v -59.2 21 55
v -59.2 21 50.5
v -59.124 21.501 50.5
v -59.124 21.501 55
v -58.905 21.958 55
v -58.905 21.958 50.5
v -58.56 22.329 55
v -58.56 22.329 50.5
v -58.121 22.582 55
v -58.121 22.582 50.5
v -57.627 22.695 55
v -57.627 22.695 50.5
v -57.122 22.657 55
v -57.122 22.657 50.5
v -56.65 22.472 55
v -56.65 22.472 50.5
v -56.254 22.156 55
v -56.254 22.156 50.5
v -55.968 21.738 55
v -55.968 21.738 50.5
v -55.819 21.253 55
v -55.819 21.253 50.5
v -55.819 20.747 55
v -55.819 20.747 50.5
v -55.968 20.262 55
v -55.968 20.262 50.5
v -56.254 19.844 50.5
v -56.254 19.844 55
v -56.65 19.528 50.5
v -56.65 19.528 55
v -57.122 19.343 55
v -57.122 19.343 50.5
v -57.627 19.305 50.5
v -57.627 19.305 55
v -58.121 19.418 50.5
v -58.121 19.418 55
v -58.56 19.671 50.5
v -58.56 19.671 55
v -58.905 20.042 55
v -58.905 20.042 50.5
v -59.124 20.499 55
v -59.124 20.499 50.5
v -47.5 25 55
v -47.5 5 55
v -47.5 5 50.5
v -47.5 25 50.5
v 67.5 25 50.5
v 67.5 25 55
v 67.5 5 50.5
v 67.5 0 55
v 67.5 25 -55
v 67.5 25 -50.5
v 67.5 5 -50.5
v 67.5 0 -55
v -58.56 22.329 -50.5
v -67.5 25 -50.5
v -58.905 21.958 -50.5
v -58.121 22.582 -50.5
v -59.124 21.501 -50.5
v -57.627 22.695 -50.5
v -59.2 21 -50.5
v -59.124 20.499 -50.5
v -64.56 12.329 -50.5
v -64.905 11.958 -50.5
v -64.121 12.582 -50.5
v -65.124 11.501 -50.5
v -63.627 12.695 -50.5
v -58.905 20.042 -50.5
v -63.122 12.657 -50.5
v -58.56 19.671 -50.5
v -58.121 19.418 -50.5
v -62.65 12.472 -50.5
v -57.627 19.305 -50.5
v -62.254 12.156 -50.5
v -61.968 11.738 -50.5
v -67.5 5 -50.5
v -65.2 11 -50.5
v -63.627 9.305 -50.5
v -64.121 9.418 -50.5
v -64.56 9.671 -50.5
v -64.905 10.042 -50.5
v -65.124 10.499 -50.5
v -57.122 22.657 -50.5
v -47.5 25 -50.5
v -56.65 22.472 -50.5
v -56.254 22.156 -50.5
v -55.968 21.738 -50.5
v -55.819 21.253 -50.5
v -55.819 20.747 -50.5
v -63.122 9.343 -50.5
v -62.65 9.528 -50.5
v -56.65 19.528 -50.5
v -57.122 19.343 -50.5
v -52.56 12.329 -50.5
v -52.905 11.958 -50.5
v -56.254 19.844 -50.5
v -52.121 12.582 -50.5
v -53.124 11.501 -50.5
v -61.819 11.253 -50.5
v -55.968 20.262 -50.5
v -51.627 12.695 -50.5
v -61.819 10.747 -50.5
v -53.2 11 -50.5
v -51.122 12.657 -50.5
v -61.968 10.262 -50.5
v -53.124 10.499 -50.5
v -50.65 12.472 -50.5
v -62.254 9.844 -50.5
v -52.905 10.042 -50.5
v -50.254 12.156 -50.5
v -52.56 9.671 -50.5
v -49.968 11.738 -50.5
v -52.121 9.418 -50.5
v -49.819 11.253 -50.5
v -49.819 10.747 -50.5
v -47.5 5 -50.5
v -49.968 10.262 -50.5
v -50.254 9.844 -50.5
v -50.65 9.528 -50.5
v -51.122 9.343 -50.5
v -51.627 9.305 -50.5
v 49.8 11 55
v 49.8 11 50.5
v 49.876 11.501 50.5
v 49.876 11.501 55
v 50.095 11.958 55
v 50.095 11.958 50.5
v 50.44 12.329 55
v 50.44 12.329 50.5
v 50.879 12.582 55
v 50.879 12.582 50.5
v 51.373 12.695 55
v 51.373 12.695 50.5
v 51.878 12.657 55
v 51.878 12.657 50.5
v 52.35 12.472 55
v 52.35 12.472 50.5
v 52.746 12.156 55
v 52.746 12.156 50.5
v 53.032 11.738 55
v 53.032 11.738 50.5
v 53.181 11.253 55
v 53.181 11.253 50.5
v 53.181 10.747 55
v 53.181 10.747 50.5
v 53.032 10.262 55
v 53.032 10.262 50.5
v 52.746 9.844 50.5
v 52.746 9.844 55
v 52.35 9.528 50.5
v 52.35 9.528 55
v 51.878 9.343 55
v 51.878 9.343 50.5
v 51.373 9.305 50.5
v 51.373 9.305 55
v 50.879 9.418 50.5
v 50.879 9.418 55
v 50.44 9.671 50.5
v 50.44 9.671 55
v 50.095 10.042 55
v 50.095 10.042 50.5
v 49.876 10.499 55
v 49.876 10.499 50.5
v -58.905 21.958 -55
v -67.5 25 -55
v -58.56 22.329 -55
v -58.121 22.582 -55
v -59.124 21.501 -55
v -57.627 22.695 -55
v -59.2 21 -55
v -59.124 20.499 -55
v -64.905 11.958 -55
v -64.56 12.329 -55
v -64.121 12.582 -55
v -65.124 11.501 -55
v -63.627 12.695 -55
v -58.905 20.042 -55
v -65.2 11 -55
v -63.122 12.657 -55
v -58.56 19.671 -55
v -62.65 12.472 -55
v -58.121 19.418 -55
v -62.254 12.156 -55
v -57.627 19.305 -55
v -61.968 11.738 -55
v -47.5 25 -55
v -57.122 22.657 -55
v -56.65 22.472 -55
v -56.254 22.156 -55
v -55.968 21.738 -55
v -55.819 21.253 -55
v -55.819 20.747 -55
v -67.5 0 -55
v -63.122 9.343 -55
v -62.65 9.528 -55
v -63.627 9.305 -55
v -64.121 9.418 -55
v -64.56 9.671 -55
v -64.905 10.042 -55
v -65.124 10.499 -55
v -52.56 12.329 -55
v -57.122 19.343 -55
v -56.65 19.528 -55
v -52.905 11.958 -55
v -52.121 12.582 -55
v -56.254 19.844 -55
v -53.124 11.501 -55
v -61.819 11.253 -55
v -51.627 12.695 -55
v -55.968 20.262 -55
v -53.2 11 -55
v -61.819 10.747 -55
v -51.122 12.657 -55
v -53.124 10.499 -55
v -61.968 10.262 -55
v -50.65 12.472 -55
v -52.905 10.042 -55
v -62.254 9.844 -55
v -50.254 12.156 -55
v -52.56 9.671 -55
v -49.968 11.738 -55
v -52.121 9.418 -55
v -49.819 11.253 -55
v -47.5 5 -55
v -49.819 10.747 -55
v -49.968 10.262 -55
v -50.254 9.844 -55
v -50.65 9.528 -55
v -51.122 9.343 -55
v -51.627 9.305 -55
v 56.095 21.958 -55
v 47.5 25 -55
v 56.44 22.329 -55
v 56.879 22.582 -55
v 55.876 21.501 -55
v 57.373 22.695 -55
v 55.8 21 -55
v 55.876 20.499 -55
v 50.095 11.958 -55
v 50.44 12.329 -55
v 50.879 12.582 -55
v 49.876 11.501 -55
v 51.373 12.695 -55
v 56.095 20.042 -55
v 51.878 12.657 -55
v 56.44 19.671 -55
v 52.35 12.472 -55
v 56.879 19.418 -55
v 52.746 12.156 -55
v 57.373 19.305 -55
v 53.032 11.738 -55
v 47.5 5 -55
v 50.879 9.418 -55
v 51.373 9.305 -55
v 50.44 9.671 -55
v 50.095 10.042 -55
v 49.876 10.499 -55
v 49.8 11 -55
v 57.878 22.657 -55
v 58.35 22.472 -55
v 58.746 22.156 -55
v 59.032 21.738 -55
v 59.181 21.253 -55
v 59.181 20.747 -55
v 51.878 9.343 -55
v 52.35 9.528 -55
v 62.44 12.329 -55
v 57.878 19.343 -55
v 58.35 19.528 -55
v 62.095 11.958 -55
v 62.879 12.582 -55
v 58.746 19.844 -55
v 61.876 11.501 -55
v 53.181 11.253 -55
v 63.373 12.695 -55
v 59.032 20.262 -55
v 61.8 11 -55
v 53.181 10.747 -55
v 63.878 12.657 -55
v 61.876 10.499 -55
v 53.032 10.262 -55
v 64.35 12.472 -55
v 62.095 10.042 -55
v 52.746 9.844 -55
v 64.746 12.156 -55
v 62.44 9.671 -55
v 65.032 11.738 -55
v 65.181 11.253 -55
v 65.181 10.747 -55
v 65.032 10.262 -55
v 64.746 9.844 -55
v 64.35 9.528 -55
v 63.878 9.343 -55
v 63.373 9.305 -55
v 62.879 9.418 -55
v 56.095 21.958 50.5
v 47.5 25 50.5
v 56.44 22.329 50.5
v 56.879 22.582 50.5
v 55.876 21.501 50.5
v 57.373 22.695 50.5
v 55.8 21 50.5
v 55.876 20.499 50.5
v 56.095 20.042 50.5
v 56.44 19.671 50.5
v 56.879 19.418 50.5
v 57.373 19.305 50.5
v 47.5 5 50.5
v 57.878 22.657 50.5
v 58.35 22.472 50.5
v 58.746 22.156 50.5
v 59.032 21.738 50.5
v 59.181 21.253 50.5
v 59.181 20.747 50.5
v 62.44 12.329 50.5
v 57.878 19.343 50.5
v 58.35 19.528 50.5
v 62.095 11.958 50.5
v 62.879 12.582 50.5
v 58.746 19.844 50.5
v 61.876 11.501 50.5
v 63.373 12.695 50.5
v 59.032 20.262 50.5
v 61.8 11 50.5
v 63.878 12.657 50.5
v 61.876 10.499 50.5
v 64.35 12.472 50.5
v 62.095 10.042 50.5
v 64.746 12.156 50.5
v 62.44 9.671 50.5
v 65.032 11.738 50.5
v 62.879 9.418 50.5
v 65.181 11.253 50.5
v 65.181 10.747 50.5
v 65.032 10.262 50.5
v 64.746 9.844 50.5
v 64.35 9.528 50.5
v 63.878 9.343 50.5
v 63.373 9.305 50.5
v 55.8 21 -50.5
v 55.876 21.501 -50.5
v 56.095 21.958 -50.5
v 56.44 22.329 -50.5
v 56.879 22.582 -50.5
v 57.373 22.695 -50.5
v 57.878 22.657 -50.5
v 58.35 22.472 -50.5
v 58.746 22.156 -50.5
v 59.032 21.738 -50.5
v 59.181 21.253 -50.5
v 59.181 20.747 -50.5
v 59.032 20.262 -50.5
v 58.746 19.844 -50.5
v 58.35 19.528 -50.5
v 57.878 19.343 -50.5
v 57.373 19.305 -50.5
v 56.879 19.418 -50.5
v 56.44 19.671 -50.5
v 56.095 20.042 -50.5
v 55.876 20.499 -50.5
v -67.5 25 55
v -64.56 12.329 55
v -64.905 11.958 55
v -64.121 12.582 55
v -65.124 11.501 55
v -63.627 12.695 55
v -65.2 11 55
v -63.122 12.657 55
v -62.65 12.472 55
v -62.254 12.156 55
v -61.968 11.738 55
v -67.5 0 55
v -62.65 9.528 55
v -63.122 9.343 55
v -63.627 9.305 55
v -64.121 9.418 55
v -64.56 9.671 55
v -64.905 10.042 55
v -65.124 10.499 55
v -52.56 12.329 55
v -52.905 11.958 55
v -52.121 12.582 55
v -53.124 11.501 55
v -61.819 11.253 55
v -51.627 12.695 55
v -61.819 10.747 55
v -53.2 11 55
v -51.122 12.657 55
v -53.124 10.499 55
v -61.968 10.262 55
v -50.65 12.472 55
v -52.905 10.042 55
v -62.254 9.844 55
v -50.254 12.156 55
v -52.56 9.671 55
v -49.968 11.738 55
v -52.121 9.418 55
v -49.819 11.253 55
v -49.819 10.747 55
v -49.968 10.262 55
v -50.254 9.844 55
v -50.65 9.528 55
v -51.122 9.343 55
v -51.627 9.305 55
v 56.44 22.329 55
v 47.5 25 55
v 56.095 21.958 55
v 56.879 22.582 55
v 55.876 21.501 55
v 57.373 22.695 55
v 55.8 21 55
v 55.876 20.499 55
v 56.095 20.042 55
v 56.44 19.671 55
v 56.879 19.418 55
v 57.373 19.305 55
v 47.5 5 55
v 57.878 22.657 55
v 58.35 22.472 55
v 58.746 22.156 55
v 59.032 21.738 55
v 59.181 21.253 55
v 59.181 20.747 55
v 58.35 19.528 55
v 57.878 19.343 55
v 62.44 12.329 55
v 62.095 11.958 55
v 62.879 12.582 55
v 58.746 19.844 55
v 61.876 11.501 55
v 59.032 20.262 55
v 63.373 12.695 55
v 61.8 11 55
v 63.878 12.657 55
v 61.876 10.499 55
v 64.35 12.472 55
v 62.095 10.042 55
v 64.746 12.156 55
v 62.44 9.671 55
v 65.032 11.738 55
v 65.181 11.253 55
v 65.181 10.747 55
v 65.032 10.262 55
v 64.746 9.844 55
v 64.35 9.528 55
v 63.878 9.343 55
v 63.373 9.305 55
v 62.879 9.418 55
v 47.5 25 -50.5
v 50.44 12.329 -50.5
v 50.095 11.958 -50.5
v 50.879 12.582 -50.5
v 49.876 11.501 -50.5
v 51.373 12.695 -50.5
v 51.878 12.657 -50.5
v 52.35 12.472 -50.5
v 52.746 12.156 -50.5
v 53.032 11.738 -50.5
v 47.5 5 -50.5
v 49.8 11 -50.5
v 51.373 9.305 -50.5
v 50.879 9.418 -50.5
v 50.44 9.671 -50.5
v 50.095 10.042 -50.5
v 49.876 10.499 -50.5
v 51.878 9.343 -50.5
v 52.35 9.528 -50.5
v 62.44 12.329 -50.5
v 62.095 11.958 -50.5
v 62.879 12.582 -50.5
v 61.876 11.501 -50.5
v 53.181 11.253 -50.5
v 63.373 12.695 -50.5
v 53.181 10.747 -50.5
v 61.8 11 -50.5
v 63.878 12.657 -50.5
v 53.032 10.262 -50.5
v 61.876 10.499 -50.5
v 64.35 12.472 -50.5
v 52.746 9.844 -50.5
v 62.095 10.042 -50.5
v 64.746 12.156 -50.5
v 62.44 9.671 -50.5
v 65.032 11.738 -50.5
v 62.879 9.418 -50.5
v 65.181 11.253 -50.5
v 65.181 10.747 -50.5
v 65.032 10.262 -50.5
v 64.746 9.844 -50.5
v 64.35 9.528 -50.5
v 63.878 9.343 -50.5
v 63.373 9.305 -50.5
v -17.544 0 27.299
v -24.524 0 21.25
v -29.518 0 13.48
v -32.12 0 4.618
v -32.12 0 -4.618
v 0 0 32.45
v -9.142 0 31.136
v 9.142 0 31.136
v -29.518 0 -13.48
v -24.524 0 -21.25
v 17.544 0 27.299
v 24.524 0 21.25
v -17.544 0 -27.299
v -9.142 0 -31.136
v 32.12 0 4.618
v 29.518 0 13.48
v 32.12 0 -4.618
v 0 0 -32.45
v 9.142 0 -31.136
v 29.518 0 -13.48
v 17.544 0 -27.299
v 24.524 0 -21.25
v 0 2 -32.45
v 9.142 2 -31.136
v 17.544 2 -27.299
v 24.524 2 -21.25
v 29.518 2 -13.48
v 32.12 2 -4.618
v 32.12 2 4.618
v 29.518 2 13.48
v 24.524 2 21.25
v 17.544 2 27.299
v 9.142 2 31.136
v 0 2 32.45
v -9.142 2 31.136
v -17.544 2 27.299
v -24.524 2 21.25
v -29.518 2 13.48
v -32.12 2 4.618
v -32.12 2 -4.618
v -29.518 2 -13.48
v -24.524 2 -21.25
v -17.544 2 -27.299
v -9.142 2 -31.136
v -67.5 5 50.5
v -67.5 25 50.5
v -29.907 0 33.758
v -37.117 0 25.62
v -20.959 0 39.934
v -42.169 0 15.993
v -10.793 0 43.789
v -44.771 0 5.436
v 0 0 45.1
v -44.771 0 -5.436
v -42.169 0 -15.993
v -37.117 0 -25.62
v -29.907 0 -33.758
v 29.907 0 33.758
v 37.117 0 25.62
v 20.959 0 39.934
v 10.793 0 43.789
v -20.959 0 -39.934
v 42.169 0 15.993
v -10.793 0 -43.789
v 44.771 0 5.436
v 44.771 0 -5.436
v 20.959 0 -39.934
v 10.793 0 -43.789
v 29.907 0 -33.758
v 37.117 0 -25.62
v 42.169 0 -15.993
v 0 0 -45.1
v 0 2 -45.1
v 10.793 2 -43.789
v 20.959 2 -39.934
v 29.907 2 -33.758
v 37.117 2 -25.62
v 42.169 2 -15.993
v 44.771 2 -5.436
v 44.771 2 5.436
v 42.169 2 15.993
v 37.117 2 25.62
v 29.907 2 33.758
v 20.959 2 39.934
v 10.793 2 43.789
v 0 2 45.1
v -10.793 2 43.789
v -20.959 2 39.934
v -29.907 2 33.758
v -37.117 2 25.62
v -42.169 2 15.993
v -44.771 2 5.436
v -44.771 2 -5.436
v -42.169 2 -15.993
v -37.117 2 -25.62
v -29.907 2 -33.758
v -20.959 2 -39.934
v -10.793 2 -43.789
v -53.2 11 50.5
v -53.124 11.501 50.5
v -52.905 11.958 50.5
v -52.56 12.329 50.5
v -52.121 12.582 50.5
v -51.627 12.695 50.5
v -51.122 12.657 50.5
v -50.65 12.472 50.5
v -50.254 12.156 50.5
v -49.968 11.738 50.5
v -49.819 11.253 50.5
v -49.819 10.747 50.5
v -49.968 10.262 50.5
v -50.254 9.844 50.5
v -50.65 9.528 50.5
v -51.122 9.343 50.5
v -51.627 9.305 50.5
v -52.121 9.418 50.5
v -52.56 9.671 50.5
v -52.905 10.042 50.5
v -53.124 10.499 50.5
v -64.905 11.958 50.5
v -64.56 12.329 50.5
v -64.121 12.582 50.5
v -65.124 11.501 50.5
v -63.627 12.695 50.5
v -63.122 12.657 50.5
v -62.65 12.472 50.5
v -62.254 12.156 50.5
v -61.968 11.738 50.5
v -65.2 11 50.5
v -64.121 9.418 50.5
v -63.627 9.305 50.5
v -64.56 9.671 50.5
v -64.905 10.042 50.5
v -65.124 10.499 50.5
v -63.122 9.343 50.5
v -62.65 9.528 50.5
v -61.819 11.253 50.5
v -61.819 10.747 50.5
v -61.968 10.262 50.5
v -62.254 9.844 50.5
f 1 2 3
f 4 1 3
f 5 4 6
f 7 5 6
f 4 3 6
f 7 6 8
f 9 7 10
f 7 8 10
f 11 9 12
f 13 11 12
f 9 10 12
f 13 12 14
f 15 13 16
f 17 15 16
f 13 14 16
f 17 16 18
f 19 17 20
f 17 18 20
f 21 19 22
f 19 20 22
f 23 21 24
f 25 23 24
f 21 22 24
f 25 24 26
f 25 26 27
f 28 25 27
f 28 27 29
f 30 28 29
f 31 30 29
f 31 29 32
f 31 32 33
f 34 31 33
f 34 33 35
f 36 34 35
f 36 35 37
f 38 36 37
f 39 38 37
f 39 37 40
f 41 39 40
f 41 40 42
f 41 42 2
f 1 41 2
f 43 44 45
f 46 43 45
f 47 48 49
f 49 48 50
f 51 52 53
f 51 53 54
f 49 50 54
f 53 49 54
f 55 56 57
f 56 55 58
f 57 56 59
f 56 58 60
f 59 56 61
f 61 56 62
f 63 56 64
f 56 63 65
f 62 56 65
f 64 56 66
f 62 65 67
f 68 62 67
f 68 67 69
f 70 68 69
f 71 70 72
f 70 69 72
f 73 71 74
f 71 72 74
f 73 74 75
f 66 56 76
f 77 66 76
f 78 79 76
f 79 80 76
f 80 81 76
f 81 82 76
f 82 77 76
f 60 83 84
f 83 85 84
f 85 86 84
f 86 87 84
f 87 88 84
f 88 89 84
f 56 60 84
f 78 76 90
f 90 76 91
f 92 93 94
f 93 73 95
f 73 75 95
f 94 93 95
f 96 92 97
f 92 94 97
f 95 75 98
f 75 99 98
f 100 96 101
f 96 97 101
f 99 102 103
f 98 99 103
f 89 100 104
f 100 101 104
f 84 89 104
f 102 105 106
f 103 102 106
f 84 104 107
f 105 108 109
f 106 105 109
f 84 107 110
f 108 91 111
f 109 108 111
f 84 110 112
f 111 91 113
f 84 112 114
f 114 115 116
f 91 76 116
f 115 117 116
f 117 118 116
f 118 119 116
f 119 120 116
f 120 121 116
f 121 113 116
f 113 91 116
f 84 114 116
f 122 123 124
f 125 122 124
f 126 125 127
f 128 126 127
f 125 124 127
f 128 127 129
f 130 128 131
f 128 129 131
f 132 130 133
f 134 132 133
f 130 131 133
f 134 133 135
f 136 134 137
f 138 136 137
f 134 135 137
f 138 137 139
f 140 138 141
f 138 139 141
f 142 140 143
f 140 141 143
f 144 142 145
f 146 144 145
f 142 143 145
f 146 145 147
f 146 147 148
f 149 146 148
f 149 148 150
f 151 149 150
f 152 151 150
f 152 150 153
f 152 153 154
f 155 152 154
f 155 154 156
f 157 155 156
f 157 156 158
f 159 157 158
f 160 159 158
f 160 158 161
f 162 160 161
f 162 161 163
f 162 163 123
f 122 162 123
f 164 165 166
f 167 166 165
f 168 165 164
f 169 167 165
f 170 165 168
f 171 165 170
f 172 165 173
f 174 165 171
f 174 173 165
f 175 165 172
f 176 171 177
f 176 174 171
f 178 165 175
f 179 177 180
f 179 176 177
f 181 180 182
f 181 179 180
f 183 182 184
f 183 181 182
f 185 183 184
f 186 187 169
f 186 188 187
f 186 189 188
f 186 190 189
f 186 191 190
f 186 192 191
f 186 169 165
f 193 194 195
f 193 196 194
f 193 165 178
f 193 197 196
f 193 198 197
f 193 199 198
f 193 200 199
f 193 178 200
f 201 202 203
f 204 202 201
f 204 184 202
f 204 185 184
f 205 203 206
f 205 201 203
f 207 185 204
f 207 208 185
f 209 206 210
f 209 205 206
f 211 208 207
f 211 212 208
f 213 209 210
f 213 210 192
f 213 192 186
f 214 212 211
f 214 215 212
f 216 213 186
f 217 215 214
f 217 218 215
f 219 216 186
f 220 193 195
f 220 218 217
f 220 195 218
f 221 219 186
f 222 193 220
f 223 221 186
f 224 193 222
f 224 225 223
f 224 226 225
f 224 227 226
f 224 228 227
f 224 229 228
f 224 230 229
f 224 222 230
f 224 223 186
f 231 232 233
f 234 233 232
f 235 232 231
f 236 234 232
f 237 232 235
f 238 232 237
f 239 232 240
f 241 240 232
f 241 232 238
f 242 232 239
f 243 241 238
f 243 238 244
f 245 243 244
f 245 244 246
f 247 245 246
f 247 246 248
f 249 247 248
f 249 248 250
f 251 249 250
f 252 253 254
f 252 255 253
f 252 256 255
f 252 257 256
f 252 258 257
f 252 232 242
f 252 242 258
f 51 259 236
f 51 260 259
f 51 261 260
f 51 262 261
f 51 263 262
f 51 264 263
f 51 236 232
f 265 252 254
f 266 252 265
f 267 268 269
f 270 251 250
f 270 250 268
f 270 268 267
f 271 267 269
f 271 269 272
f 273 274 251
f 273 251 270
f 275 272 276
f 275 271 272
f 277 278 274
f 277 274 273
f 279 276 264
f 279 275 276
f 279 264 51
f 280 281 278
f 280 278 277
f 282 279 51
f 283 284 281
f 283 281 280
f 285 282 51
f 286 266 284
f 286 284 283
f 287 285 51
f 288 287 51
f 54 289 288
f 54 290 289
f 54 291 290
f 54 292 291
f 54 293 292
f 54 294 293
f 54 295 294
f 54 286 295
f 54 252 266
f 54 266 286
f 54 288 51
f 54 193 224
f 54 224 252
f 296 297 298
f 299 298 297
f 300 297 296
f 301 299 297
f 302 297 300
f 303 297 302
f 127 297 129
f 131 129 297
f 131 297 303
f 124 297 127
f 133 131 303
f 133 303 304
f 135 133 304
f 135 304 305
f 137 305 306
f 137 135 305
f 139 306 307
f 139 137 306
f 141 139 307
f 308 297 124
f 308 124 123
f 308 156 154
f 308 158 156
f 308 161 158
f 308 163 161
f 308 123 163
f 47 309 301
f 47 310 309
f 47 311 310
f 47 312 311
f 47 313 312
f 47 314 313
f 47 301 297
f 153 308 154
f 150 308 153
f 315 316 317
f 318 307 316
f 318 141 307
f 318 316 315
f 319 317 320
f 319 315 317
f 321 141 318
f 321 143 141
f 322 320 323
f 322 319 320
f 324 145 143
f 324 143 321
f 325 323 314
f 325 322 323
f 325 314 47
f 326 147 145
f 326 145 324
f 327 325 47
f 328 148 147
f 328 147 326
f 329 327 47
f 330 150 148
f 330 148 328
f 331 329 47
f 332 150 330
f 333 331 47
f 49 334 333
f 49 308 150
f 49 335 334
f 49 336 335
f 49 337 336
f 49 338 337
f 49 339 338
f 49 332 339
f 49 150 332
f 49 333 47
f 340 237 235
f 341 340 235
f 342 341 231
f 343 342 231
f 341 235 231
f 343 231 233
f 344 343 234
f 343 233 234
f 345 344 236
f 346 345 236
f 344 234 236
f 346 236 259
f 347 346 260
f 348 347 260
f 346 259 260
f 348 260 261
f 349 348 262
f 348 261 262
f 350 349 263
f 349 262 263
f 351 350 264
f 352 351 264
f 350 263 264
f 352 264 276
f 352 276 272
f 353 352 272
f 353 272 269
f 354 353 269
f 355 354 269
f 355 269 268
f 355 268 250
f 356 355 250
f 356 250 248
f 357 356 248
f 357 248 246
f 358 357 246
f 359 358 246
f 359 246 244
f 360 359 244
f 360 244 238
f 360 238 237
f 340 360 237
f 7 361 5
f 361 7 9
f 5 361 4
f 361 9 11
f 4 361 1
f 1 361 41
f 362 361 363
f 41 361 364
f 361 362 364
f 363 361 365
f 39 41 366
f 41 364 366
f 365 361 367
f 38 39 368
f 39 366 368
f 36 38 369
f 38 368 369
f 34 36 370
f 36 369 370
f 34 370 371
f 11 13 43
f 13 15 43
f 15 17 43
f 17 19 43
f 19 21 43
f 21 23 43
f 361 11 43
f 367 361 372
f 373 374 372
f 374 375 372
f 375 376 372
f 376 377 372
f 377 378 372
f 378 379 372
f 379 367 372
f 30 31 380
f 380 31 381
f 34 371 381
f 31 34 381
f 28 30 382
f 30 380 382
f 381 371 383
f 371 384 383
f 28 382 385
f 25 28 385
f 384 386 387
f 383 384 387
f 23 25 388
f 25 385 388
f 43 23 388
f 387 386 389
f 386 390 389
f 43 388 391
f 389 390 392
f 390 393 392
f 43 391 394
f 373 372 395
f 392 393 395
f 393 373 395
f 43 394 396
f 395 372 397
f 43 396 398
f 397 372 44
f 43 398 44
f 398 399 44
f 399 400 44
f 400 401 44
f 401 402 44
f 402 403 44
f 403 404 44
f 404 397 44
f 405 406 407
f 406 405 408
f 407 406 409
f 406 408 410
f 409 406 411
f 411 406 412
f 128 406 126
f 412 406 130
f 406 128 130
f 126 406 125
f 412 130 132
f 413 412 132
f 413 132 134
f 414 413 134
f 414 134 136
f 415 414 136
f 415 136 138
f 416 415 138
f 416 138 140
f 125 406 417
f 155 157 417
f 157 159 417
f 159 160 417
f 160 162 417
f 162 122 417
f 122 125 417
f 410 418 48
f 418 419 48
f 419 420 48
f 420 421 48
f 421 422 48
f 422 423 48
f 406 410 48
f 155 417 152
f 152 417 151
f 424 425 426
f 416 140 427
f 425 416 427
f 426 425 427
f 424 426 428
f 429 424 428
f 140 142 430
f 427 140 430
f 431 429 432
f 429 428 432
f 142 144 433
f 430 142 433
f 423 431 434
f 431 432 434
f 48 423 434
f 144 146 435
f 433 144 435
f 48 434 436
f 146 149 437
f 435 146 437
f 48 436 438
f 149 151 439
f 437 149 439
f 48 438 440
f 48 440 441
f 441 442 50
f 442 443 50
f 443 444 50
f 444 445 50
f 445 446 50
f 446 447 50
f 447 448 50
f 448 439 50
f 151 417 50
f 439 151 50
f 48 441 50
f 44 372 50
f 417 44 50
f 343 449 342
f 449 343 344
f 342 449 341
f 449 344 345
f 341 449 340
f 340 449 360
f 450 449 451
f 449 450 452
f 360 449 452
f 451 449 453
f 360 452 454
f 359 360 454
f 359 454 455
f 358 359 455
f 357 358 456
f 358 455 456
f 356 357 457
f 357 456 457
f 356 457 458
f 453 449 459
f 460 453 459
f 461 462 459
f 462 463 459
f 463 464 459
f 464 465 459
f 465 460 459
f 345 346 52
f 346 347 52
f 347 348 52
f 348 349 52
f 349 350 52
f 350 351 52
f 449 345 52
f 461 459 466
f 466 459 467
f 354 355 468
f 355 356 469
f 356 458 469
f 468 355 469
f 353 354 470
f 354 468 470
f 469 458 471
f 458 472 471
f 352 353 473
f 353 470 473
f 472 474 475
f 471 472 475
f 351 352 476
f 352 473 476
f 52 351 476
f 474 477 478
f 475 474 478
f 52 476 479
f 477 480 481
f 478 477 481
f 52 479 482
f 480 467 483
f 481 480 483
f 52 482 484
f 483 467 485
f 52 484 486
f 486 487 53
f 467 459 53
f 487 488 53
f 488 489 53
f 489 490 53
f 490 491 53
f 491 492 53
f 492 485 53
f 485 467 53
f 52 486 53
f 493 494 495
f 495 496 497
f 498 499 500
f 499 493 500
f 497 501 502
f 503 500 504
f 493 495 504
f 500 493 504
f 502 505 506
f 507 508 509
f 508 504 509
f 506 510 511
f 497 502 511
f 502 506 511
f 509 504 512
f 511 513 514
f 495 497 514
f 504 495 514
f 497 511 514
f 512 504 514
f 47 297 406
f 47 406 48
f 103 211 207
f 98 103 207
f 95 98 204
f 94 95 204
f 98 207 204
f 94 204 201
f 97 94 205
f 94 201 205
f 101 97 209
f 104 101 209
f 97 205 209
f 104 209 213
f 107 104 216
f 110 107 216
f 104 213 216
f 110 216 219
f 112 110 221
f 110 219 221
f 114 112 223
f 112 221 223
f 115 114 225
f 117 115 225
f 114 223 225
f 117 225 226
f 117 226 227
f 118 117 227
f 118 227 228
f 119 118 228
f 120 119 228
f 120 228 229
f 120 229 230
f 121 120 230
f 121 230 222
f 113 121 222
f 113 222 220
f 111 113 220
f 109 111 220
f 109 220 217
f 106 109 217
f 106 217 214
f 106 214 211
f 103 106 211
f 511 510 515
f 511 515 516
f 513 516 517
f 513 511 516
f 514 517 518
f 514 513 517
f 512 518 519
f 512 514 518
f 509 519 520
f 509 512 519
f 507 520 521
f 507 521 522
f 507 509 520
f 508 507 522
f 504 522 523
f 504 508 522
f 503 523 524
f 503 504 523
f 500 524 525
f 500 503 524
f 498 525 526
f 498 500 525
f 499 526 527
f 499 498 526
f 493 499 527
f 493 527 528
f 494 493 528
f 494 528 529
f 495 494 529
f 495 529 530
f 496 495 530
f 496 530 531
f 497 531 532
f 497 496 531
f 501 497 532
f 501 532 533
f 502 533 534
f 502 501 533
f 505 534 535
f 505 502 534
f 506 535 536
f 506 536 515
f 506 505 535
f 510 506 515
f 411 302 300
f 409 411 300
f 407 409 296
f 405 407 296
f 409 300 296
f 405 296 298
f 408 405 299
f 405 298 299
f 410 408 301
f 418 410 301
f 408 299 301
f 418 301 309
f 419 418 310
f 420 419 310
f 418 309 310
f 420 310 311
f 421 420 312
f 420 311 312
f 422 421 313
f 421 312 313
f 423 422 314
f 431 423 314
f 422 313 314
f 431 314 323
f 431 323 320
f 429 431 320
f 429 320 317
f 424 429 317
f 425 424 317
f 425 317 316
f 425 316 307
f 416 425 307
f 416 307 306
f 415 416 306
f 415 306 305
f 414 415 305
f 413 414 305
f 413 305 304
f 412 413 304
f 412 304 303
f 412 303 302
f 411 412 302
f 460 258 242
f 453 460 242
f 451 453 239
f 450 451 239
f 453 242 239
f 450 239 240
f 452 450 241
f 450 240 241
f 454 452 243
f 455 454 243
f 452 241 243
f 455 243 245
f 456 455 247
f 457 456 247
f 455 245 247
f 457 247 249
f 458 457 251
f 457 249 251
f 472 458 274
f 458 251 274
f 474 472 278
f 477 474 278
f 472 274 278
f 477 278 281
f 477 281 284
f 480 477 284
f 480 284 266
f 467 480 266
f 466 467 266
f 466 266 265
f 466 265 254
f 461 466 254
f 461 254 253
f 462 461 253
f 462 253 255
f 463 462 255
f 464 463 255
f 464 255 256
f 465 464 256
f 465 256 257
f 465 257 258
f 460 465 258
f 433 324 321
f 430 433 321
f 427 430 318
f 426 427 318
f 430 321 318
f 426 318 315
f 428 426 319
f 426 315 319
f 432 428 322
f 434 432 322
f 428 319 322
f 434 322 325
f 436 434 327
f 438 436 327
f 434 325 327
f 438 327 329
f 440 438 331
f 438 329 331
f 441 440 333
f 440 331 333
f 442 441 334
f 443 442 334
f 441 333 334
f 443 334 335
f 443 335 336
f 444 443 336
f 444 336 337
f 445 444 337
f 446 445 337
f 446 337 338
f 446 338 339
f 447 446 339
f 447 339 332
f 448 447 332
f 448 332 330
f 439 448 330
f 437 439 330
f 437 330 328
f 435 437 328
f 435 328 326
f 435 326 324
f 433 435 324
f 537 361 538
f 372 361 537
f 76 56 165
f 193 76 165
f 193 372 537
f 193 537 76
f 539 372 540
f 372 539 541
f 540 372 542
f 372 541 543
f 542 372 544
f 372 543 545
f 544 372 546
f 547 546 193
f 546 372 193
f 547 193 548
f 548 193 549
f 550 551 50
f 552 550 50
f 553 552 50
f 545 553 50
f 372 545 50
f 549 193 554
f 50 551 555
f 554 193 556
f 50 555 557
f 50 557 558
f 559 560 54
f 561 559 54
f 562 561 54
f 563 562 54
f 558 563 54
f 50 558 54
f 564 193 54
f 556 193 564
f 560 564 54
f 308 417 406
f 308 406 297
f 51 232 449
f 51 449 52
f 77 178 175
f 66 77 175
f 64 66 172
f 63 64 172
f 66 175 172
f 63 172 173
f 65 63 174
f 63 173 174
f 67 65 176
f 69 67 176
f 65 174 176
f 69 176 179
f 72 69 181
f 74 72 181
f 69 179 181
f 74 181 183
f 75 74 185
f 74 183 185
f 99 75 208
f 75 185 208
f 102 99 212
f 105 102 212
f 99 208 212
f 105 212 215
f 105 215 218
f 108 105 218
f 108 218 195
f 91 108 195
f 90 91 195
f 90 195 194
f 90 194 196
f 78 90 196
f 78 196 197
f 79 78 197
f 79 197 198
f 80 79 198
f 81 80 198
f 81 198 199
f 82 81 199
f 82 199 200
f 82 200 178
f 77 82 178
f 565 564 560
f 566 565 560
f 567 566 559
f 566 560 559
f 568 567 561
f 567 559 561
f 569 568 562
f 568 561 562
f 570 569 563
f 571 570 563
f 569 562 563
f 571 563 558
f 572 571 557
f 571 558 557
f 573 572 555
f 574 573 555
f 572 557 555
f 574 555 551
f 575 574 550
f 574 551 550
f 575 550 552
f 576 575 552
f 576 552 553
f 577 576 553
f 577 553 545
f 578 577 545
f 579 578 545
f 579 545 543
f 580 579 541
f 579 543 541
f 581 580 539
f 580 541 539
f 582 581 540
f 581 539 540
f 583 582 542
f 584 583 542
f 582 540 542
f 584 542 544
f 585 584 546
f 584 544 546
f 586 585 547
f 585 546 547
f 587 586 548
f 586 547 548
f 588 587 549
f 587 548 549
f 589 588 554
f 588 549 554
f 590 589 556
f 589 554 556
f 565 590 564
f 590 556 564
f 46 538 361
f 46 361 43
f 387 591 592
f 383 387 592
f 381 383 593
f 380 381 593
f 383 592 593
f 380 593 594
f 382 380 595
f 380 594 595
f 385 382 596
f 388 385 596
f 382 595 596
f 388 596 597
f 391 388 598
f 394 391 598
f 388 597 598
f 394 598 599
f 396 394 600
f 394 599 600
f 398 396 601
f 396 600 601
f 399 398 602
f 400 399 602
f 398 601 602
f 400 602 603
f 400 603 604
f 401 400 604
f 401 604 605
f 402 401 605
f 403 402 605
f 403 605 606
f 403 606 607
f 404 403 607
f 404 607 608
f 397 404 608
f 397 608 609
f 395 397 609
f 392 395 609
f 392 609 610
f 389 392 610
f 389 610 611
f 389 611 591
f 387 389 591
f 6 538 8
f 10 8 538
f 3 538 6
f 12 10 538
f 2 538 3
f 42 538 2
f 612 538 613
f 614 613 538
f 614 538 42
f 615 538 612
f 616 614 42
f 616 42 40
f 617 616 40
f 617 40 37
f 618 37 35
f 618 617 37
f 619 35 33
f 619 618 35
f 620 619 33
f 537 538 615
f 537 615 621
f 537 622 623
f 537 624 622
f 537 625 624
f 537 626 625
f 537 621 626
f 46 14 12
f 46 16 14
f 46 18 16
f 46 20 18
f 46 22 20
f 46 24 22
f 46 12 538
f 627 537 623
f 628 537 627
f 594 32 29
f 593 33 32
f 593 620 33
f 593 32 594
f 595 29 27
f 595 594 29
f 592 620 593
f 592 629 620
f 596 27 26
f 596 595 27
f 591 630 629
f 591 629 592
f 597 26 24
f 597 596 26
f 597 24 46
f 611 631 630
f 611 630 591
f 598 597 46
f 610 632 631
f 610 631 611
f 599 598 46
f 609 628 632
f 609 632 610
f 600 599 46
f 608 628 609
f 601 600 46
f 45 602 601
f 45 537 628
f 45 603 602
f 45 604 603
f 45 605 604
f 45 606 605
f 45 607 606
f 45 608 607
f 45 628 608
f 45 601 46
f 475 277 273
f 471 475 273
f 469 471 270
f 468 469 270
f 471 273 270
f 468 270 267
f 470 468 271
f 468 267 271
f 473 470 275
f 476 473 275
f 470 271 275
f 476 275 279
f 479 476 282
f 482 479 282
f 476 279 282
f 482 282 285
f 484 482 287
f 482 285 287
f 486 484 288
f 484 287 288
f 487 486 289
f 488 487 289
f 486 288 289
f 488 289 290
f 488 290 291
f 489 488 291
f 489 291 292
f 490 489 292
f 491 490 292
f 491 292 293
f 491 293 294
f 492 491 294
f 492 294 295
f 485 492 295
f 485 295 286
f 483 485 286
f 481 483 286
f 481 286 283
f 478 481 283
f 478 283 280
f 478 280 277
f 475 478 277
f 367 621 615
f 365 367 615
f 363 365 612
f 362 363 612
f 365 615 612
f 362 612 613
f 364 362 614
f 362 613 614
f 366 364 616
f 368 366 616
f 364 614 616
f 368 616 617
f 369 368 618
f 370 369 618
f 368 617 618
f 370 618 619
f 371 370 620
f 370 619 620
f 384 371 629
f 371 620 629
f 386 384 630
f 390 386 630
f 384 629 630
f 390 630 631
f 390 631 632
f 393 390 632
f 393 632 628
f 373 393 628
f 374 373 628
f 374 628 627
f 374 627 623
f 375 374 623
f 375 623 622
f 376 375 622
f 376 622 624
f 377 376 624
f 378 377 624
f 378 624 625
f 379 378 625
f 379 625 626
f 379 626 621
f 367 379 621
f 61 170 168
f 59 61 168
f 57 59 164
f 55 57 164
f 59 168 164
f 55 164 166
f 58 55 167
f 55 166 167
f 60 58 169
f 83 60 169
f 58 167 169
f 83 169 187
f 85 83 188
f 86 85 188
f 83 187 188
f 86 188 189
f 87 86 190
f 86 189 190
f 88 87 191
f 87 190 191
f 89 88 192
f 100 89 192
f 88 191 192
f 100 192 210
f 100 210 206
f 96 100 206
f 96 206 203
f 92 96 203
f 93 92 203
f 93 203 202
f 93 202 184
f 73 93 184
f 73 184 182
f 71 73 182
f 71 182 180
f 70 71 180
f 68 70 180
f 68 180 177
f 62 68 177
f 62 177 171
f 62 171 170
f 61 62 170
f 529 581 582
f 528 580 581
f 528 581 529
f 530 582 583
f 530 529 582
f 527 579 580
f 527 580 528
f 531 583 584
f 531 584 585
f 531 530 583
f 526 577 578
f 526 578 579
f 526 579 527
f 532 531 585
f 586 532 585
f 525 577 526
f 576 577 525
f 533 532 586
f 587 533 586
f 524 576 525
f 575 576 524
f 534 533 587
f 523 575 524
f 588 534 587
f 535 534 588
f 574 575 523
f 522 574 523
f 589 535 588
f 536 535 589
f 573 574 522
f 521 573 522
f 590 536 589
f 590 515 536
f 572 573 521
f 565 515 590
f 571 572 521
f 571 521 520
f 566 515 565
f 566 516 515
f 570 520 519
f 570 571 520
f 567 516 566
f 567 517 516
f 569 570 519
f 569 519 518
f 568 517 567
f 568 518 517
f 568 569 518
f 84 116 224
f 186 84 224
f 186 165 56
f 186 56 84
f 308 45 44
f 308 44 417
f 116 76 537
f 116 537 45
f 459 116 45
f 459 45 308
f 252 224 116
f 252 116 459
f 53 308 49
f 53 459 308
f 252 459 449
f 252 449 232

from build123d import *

# Parameters (mm, degrees)
SKETCH_1_W          = 135
SKETCH_1_H          = 110
EXTRUDE_1_DEPTH     = 5
SKETCH_2_W          = 20
SKETCH_2_H          = 4.5
EXTRUDE_2_DEPTH     = 20
SKETCH_3_R          = 1.7
CUT_EXTRUDE_1_DEPTH = 130
SKETCH_4_R          = 45.1
SKETCH_4_R_2        = 32.45
CUT_EXTRUDE_2_DEPTH = 2


with BuildPart() as part:
    # 草图1 → 凸台-拉伸1 (new body)
    with BuildSketch(Plane(origin=(0, 0, 0), x_dir=(1, 0, 0), z_dir=(0, 1, 0))):
        Rectangle(SKETCH_1_W, SKETCH_1_H)
    extrude(amount=EXTRUDE_1_DEPTH)

    # 草图2 → 凸台-拉伸2 (add)
    with BuildSketch(Plane(origin=(0, 5, 0), x_dir=(1, 0, 0), z_dir=(0, 1, 0))):
        with Locations((57.5, 52.75)):
            Rectangle(SKETCH_2_W, SKETCH_2_H)
        with Locations((-57.5, 52.75)):
            Rectangle(SKETCH_2_W, SKETCH_2_H)
        with Locations((-57.5, -52.75)):
            Rectangle(SKETCH_2_W, SKETCH_2_H)
        with Locations((57.5, -52.75)):
            Rectangle(SKETCH_2_W, SKETCH_2_H)
    extrude(amount=EXTRUDE_2_DEPTH)

    # 草图3 → 切除-拉伸1 (cut)
    with BuildSketch(Plane(origin=(0, 0, -55), x_dir=(-1, 0, 0), z_dir=(0, 0, -1))):
        with Locations((57.5, 21)):
            Circle(SKETCH_3_R)
        with Locations((51.5, 11)):
            Circle(SKETCH_3_R)
        with Locations((63.5, 11)):
            Circle(SKETCH_3_R)
        with Locations((-51.5, 11)):
            Circle(SKETCH_3_R)
        with Locations((-63.5, 11)):
            Circle(SKETCH_3_R)
        with Locations((-57.5, 21)):
            Circle(SKETCH_3_R)
    extrude(amount=-CUT_EXTRUDE_1_DEPTH, mode=Mode.SUBTRACT)

    # 草图4 → 切除-拉伸2 (cut)
    with BuildSketch(Plane.XZ):
        with Locations(Location((0, 0, 0), (0, 0, 270))):
            Circle(SKETCH_4_R)
        with Locations(Location((0, 0, 0), (0, 0, 270))):
            Circle(SKETCH_4_R_2, mode=Mode.SUBTRACT)
    extrude(amount=-CUT_EXTRUDE_2_DEPTH, mode=Mode.SUBTRACT)


solid = part.part
